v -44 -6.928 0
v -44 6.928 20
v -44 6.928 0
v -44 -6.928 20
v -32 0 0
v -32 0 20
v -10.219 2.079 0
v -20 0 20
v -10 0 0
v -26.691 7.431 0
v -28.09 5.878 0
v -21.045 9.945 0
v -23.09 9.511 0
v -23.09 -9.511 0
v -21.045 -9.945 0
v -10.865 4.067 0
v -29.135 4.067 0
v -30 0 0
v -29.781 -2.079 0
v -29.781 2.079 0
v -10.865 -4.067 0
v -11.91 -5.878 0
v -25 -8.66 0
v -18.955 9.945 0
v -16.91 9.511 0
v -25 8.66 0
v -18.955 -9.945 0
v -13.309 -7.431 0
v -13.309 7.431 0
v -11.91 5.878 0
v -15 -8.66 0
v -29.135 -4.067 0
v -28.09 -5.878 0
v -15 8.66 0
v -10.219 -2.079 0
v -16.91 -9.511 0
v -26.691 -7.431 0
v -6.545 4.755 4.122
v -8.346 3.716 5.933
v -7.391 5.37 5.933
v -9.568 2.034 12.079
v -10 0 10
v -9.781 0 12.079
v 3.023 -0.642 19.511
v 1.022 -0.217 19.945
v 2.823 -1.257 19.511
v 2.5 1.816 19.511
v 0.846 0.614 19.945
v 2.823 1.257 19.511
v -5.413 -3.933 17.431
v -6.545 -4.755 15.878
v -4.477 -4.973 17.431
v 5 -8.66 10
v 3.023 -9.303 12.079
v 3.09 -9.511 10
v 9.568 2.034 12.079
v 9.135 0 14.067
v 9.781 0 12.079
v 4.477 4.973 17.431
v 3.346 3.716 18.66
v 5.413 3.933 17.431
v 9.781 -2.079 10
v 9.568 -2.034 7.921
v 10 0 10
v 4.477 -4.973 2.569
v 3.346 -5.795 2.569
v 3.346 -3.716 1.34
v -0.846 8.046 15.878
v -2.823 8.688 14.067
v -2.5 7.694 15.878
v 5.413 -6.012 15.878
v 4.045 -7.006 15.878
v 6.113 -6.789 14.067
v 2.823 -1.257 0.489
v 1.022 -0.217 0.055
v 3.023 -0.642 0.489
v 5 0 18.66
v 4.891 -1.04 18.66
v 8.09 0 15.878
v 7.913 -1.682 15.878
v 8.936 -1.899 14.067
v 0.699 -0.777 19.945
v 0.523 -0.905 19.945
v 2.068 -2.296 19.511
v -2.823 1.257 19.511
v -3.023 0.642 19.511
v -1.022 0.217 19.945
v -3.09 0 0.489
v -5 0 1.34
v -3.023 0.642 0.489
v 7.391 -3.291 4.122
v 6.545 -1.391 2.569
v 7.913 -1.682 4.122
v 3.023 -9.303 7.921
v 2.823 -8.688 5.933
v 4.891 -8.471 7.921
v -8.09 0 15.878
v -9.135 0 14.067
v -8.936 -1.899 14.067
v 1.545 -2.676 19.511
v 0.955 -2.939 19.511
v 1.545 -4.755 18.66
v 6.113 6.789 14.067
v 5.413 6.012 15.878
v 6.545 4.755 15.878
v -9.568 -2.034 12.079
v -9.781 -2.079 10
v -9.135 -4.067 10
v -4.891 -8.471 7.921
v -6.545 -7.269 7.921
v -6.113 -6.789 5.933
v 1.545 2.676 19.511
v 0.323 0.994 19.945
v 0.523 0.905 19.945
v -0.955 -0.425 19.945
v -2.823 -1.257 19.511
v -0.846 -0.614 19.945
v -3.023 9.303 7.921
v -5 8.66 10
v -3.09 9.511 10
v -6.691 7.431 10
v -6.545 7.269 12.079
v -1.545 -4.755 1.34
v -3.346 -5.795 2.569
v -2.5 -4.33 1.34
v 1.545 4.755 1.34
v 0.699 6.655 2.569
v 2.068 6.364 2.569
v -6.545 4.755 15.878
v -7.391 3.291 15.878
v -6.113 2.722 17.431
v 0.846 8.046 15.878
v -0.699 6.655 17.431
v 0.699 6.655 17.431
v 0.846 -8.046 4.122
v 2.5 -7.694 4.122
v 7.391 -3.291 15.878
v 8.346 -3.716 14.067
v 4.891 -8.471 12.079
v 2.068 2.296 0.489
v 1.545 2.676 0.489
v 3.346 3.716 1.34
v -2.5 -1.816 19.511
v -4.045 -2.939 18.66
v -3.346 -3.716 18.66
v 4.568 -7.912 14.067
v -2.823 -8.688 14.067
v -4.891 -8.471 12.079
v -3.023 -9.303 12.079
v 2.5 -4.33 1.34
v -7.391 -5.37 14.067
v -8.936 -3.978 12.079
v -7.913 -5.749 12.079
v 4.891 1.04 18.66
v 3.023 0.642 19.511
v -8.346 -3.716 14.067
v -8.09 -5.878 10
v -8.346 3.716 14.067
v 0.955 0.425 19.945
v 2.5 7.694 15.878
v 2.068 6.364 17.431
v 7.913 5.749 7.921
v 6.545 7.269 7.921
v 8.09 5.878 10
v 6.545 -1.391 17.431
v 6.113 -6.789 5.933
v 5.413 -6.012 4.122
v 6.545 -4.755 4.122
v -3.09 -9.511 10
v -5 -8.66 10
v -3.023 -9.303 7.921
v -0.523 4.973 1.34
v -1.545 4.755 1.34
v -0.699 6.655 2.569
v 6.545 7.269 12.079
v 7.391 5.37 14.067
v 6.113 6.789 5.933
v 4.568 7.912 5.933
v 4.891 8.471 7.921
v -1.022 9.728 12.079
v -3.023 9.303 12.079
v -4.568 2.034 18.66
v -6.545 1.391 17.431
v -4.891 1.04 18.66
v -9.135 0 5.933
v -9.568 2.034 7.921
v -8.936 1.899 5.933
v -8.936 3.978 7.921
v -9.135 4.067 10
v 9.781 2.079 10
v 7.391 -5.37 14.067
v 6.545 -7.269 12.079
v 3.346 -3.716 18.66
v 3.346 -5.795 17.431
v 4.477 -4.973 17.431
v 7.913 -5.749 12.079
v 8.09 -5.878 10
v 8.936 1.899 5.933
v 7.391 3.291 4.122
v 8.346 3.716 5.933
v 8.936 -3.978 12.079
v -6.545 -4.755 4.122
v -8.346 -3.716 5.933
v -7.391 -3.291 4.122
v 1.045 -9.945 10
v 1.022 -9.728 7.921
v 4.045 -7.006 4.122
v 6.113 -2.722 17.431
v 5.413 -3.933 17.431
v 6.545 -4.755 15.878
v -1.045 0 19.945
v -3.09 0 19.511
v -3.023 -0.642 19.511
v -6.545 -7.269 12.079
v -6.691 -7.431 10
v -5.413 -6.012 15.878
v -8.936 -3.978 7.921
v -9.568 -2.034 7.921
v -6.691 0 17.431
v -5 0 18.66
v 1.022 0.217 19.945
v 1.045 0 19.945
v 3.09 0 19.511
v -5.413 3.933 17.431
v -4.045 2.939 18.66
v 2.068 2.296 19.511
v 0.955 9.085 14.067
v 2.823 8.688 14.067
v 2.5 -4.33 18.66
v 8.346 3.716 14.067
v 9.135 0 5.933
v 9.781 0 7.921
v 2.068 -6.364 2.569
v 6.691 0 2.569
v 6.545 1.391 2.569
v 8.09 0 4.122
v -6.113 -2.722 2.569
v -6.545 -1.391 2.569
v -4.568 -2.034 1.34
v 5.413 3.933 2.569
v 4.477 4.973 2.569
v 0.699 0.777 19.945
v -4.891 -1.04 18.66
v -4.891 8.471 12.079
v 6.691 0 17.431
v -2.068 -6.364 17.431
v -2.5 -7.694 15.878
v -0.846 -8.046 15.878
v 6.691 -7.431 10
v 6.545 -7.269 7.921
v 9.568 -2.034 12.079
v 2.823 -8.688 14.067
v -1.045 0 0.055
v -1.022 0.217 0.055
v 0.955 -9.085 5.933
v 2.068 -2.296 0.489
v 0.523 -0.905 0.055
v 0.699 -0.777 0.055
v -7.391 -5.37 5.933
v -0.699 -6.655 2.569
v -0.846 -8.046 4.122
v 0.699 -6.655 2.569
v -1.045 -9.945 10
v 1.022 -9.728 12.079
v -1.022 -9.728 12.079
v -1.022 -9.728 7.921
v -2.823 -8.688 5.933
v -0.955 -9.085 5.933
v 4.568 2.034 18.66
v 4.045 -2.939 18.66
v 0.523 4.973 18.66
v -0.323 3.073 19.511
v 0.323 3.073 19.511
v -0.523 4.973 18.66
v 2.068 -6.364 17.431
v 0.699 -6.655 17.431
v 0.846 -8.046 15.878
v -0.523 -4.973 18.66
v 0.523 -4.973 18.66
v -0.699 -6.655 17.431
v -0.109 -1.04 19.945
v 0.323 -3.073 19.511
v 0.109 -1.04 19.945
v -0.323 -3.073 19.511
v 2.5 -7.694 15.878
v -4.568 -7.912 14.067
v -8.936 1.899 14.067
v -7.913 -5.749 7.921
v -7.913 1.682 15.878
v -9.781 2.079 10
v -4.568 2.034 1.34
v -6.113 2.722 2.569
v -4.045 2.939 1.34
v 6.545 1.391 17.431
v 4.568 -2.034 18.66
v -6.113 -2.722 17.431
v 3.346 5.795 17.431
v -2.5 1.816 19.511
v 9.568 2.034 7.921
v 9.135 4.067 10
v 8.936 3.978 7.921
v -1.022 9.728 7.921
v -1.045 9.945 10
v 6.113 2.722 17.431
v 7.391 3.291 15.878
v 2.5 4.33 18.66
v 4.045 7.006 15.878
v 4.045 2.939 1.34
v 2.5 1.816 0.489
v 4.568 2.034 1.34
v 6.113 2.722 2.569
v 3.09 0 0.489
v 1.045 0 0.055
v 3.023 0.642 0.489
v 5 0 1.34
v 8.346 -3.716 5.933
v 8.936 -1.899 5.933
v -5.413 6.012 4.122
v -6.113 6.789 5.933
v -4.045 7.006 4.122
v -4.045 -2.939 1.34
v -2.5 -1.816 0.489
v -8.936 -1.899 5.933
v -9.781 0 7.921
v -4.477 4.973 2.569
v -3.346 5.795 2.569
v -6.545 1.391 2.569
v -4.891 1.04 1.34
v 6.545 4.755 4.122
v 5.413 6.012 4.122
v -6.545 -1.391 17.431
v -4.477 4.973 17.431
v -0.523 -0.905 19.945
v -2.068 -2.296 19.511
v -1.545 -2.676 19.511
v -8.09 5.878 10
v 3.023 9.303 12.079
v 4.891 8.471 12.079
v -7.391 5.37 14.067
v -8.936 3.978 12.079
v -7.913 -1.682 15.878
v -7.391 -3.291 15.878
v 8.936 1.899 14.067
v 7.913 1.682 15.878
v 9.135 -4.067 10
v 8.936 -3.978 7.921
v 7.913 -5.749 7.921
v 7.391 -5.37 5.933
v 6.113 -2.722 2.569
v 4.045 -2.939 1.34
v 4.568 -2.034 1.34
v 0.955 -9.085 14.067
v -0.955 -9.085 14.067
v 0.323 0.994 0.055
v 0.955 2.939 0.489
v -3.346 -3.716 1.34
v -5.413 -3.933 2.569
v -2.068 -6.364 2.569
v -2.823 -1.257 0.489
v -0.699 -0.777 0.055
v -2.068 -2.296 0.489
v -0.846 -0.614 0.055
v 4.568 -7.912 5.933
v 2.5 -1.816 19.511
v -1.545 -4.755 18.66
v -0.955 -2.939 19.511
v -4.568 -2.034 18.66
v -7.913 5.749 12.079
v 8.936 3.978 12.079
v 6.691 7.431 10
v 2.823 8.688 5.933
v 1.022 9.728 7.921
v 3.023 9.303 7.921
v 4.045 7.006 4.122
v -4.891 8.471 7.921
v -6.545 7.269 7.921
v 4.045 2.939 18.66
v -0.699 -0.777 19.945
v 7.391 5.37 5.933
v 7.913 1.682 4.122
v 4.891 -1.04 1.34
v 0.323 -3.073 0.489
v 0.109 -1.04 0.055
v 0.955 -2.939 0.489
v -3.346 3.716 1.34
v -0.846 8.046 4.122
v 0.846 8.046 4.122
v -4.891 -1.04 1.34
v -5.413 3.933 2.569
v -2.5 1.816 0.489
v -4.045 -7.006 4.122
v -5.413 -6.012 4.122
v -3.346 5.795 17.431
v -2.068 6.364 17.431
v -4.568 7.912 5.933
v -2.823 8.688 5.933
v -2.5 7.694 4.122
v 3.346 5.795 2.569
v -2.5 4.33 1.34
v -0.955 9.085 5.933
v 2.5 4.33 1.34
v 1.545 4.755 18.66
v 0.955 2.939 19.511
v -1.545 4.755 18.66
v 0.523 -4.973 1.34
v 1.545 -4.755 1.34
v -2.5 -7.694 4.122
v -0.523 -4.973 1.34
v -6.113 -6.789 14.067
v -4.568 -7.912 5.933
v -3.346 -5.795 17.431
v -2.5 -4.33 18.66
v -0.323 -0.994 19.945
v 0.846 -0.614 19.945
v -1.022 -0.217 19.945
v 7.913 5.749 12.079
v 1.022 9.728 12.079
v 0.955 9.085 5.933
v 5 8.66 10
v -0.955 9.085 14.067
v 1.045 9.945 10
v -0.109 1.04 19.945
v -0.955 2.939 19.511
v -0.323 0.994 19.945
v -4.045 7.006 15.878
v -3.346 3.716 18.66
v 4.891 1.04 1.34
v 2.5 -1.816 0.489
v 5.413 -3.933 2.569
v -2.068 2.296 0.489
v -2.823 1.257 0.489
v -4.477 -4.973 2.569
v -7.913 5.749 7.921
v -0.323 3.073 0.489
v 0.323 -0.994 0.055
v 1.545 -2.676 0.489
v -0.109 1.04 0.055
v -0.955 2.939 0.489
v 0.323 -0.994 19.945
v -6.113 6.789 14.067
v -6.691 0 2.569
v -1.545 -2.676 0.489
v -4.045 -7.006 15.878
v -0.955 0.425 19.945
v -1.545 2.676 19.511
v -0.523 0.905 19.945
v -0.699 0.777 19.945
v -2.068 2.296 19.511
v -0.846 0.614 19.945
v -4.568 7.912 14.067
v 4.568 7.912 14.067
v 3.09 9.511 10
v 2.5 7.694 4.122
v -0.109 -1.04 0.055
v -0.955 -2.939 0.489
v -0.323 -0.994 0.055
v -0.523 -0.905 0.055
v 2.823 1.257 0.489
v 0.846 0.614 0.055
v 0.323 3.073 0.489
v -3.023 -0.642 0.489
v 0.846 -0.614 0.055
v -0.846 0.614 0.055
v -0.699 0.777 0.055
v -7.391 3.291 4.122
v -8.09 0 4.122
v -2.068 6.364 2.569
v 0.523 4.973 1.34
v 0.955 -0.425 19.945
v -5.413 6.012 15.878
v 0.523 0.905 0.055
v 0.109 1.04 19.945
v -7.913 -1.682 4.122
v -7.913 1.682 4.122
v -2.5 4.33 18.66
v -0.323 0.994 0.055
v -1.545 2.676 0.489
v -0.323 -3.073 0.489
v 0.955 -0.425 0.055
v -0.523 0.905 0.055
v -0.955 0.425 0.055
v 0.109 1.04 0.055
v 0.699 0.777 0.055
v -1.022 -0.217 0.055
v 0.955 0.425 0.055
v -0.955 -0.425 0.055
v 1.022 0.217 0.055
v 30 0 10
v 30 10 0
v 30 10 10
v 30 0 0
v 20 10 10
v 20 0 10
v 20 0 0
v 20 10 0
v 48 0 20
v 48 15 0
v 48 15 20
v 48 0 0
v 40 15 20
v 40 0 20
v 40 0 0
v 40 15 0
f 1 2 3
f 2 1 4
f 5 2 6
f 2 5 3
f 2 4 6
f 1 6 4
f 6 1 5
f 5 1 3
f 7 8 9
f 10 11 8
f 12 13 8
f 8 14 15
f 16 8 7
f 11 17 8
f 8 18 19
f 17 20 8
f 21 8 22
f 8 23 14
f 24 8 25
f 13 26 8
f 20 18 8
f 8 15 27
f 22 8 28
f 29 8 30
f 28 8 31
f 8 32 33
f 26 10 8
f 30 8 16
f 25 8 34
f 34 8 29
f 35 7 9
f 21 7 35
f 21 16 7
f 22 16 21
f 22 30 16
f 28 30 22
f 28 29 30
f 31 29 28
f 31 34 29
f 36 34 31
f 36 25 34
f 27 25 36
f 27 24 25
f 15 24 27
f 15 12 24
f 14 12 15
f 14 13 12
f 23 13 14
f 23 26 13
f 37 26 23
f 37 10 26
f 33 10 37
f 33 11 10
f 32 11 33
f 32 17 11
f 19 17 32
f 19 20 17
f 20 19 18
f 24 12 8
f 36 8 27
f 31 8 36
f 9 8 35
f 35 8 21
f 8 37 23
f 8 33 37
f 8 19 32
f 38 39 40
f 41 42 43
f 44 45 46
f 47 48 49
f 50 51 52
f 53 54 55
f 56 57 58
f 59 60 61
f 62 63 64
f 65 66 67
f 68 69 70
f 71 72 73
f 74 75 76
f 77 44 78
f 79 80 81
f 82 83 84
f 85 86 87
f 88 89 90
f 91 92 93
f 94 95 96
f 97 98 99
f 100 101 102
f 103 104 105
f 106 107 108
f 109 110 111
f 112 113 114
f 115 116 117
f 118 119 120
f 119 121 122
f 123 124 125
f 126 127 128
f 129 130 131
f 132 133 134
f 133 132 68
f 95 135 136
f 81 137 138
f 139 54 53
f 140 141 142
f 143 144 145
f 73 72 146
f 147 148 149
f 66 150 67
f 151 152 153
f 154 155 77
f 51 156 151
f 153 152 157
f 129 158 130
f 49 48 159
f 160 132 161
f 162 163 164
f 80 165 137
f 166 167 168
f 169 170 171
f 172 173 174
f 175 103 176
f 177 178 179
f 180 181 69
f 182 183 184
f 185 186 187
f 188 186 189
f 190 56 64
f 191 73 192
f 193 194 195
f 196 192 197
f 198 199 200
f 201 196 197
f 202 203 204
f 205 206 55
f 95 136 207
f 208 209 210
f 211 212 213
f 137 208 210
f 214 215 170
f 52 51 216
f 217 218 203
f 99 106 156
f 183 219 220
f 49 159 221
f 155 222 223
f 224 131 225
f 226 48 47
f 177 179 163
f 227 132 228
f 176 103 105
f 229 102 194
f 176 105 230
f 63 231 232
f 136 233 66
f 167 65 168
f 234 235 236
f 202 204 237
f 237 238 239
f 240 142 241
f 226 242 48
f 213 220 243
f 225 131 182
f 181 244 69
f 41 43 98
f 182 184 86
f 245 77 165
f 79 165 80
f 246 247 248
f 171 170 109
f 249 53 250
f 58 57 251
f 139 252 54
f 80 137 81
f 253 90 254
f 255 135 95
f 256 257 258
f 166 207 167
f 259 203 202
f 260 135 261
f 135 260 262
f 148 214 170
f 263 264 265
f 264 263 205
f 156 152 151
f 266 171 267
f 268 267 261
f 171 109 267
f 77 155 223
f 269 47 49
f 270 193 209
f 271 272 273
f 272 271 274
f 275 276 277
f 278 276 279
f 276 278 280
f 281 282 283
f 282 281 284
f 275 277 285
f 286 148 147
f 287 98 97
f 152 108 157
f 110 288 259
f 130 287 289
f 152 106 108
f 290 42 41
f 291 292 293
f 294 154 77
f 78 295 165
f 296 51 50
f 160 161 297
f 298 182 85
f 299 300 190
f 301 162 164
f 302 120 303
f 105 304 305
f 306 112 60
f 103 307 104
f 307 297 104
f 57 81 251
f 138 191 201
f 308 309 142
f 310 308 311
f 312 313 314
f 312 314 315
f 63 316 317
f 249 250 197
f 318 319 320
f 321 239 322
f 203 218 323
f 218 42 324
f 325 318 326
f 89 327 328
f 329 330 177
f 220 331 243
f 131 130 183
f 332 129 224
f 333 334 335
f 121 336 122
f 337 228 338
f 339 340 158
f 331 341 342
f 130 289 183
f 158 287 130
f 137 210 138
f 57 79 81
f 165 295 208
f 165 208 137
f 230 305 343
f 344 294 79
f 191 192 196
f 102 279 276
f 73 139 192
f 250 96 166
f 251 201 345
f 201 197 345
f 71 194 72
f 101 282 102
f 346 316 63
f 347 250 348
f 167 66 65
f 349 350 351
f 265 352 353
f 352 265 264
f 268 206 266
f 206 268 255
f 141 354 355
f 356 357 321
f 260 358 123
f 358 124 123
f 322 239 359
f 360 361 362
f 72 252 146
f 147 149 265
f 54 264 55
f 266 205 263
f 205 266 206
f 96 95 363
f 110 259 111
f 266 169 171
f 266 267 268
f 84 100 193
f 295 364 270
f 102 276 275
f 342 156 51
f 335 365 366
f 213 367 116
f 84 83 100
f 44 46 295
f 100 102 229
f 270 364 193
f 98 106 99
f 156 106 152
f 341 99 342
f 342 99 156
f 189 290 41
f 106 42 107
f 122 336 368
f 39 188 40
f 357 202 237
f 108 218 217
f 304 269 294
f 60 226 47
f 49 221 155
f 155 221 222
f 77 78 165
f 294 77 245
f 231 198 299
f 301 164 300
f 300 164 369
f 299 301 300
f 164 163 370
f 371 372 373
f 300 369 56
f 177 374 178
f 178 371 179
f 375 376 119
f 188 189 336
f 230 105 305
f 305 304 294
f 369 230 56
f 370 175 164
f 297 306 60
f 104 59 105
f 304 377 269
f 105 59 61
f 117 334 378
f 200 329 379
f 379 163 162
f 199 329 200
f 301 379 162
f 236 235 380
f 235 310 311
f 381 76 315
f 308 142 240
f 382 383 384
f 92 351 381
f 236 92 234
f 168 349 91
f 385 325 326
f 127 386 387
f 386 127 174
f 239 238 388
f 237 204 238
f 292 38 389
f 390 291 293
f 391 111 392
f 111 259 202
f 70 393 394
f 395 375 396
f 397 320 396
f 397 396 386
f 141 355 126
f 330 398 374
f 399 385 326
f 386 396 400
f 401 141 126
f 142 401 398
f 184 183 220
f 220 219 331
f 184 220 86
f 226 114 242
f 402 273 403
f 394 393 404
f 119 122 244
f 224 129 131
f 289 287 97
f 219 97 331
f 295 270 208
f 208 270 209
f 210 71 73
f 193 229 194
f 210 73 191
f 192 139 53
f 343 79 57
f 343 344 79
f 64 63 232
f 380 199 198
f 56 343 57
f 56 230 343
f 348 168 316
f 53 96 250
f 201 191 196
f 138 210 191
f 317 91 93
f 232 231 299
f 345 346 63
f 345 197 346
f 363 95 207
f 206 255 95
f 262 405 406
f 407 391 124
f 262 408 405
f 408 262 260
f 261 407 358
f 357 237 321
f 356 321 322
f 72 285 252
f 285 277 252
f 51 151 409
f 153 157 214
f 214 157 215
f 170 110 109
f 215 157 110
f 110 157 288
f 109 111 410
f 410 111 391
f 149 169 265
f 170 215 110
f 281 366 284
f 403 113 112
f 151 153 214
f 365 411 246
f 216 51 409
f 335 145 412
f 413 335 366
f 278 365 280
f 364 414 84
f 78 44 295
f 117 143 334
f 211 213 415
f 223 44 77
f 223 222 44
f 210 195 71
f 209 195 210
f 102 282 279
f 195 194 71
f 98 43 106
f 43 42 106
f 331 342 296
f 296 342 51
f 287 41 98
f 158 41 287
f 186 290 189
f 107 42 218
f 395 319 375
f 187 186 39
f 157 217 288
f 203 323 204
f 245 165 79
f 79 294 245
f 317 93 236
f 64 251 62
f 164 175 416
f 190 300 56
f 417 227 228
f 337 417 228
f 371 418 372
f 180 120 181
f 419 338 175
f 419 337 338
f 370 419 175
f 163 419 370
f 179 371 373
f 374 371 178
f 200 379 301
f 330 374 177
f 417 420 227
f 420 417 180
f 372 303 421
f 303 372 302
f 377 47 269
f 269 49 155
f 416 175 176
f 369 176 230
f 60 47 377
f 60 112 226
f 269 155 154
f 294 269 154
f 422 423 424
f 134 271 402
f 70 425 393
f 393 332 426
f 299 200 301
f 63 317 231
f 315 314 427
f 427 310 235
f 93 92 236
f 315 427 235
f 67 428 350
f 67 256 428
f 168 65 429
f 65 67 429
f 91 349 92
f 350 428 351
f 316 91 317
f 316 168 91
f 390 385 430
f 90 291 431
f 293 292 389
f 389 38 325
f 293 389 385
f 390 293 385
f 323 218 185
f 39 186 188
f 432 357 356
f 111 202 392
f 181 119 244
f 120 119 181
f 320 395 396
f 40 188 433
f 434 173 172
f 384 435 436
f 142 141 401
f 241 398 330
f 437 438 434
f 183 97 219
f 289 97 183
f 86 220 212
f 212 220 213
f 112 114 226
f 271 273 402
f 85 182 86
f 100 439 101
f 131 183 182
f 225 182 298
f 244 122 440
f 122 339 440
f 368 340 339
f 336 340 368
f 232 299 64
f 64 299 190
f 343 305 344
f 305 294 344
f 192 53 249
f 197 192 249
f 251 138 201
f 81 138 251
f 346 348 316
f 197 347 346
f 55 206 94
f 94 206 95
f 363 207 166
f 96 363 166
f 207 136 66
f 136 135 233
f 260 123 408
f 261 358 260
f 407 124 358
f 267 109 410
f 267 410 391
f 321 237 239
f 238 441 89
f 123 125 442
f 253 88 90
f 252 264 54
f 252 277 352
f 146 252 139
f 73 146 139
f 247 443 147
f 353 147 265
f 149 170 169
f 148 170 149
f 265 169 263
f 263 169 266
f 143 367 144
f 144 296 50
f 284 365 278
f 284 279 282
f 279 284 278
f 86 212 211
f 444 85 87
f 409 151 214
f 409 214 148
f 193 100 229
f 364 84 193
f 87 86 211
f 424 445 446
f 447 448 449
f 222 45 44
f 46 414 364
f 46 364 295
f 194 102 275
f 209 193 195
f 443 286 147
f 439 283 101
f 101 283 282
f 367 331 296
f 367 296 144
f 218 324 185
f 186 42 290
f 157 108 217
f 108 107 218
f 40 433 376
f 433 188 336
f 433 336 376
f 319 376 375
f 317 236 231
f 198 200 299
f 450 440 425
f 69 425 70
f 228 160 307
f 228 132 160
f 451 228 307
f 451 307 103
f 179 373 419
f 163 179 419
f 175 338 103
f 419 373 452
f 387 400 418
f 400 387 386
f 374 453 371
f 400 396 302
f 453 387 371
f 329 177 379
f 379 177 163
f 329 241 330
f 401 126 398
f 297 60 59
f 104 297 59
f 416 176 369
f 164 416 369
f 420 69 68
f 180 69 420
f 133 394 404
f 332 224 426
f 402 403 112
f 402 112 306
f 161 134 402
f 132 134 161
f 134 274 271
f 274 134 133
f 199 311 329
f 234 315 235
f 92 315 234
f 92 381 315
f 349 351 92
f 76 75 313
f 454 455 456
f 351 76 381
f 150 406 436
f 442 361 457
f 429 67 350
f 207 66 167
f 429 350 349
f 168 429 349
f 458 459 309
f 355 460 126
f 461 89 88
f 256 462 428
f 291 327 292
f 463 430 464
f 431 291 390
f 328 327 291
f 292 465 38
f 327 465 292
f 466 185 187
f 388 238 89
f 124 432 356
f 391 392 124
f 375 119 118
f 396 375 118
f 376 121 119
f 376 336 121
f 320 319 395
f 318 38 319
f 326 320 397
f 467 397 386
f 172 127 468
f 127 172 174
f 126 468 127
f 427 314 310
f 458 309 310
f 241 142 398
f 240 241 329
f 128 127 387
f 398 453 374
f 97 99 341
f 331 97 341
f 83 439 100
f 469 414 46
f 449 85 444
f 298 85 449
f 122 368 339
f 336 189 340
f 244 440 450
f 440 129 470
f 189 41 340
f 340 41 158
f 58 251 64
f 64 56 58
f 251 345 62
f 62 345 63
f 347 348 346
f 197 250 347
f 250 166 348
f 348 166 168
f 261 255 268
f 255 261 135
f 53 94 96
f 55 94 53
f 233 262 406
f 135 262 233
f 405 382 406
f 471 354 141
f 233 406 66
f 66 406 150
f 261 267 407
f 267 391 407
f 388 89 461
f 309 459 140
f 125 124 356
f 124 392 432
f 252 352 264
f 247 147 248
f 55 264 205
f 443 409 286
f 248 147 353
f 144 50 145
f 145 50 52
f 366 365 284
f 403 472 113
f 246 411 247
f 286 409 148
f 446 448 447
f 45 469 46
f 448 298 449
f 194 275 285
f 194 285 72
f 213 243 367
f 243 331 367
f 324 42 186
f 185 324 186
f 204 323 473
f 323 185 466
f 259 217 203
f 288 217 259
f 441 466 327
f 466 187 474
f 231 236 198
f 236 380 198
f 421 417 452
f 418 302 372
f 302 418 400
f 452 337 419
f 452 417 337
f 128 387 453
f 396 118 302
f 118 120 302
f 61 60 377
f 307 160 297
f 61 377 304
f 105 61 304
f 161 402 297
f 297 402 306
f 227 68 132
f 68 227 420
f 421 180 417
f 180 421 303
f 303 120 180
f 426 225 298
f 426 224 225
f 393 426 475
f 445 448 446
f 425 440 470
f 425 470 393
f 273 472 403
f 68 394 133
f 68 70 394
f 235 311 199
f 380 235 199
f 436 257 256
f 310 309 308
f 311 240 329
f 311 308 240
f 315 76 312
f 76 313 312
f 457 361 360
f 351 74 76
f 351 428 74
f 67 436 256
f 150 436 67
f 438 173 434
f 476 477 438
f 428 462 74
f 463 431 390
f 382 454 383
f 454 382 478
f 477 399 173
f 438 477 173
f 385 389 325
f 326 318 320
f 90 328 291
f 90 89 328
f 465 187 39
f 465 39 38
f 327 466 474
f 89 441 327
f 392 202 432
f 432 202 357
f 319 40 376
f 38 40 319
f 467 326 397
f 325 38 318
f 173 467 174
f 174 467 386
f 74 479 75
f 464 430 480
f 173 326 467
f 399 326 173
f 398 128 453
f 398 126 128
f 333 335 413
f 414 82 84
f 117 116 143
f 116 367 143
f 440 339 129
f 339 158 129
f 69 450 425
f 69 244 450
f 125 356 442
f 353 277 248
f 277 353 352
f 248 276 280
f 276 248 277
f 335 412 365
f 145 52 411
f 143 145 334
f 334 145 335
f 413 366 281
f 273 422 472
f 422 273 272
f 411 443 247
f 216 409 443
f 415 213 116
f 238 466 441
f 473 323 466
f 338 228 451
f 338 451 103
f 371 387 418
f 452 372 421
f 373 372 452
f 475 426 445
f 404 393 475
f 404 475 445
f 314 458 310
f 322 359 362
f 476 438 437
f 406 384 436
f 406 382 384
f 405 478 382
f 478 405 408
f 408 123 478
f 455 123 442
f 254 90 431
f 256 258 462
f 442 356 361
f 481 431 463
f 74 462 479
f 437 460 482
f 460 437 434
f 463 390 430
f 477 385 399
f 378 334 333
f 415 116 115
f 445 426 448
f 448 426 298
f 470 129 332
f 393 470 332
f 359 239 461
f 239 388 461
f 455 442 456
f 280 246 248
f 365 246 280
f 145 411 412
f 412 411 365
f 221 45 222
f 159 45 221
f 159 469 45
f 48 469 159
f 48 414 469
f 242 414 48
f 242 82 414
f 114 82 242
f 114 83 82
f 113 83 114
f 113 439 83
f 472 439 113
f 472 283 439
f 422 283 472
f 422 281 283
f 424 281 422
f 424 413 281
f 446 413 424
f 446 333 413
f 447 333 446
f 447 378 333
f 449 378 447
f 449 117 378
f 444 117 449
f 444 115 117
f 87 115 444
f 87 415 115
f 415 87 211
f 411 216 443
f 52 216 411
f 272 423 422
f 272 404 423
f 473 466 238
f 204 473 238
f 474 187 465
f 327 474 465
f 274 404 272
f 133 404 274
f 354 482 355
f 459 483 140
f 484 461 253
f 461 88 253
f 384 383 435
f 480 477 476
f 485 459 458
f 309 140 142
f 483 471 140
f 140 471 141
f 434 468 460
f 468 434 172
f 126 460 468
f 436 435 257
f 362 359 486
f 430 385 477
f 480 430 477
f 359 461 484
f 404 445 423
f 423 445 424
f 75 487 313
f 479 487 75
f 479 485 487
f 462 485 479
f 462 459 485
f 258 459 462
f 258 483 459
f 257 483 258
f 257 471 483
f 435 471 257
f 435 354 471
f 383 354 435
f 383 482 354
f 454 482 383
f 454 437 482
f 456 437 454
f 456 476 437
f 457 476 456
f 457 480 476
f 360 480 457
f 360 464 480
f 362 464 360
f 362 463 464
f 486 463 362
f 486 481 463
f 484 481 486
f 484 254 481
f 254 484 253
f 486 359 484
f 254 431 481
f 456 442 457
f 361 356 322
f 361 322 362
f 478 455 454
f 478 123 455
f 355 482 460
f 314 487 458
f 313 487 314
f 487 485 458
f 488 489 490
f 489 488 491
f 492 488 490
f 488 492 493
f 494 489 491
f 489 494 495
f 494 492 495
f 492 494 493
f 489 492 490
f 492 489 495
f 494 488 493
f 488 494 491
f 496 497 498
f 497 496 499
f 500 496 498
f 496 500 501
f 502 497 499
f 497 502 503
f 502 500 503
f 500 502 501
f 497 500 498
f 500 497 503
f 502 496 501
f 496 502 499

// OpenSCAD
// 三角柱
translate([-40, 0, 0]) // x,y,z
cylinder(h=20, r1=8, r2=8, $fn=3);

// 円錐
translate([-20, 0, 0])
cylinder(h=20, r1=10, r2=0); // height, radius

// 球体
translate([0, 0, 10])
sphere(10); // 球体の大きさ

// 立方体
translate([20, 0, 0])
cube(10); // 立方体の大きさ

// 生四角柱
translate([40, 0, 0])
cube([8, 15, 20]); // width,depth,height
